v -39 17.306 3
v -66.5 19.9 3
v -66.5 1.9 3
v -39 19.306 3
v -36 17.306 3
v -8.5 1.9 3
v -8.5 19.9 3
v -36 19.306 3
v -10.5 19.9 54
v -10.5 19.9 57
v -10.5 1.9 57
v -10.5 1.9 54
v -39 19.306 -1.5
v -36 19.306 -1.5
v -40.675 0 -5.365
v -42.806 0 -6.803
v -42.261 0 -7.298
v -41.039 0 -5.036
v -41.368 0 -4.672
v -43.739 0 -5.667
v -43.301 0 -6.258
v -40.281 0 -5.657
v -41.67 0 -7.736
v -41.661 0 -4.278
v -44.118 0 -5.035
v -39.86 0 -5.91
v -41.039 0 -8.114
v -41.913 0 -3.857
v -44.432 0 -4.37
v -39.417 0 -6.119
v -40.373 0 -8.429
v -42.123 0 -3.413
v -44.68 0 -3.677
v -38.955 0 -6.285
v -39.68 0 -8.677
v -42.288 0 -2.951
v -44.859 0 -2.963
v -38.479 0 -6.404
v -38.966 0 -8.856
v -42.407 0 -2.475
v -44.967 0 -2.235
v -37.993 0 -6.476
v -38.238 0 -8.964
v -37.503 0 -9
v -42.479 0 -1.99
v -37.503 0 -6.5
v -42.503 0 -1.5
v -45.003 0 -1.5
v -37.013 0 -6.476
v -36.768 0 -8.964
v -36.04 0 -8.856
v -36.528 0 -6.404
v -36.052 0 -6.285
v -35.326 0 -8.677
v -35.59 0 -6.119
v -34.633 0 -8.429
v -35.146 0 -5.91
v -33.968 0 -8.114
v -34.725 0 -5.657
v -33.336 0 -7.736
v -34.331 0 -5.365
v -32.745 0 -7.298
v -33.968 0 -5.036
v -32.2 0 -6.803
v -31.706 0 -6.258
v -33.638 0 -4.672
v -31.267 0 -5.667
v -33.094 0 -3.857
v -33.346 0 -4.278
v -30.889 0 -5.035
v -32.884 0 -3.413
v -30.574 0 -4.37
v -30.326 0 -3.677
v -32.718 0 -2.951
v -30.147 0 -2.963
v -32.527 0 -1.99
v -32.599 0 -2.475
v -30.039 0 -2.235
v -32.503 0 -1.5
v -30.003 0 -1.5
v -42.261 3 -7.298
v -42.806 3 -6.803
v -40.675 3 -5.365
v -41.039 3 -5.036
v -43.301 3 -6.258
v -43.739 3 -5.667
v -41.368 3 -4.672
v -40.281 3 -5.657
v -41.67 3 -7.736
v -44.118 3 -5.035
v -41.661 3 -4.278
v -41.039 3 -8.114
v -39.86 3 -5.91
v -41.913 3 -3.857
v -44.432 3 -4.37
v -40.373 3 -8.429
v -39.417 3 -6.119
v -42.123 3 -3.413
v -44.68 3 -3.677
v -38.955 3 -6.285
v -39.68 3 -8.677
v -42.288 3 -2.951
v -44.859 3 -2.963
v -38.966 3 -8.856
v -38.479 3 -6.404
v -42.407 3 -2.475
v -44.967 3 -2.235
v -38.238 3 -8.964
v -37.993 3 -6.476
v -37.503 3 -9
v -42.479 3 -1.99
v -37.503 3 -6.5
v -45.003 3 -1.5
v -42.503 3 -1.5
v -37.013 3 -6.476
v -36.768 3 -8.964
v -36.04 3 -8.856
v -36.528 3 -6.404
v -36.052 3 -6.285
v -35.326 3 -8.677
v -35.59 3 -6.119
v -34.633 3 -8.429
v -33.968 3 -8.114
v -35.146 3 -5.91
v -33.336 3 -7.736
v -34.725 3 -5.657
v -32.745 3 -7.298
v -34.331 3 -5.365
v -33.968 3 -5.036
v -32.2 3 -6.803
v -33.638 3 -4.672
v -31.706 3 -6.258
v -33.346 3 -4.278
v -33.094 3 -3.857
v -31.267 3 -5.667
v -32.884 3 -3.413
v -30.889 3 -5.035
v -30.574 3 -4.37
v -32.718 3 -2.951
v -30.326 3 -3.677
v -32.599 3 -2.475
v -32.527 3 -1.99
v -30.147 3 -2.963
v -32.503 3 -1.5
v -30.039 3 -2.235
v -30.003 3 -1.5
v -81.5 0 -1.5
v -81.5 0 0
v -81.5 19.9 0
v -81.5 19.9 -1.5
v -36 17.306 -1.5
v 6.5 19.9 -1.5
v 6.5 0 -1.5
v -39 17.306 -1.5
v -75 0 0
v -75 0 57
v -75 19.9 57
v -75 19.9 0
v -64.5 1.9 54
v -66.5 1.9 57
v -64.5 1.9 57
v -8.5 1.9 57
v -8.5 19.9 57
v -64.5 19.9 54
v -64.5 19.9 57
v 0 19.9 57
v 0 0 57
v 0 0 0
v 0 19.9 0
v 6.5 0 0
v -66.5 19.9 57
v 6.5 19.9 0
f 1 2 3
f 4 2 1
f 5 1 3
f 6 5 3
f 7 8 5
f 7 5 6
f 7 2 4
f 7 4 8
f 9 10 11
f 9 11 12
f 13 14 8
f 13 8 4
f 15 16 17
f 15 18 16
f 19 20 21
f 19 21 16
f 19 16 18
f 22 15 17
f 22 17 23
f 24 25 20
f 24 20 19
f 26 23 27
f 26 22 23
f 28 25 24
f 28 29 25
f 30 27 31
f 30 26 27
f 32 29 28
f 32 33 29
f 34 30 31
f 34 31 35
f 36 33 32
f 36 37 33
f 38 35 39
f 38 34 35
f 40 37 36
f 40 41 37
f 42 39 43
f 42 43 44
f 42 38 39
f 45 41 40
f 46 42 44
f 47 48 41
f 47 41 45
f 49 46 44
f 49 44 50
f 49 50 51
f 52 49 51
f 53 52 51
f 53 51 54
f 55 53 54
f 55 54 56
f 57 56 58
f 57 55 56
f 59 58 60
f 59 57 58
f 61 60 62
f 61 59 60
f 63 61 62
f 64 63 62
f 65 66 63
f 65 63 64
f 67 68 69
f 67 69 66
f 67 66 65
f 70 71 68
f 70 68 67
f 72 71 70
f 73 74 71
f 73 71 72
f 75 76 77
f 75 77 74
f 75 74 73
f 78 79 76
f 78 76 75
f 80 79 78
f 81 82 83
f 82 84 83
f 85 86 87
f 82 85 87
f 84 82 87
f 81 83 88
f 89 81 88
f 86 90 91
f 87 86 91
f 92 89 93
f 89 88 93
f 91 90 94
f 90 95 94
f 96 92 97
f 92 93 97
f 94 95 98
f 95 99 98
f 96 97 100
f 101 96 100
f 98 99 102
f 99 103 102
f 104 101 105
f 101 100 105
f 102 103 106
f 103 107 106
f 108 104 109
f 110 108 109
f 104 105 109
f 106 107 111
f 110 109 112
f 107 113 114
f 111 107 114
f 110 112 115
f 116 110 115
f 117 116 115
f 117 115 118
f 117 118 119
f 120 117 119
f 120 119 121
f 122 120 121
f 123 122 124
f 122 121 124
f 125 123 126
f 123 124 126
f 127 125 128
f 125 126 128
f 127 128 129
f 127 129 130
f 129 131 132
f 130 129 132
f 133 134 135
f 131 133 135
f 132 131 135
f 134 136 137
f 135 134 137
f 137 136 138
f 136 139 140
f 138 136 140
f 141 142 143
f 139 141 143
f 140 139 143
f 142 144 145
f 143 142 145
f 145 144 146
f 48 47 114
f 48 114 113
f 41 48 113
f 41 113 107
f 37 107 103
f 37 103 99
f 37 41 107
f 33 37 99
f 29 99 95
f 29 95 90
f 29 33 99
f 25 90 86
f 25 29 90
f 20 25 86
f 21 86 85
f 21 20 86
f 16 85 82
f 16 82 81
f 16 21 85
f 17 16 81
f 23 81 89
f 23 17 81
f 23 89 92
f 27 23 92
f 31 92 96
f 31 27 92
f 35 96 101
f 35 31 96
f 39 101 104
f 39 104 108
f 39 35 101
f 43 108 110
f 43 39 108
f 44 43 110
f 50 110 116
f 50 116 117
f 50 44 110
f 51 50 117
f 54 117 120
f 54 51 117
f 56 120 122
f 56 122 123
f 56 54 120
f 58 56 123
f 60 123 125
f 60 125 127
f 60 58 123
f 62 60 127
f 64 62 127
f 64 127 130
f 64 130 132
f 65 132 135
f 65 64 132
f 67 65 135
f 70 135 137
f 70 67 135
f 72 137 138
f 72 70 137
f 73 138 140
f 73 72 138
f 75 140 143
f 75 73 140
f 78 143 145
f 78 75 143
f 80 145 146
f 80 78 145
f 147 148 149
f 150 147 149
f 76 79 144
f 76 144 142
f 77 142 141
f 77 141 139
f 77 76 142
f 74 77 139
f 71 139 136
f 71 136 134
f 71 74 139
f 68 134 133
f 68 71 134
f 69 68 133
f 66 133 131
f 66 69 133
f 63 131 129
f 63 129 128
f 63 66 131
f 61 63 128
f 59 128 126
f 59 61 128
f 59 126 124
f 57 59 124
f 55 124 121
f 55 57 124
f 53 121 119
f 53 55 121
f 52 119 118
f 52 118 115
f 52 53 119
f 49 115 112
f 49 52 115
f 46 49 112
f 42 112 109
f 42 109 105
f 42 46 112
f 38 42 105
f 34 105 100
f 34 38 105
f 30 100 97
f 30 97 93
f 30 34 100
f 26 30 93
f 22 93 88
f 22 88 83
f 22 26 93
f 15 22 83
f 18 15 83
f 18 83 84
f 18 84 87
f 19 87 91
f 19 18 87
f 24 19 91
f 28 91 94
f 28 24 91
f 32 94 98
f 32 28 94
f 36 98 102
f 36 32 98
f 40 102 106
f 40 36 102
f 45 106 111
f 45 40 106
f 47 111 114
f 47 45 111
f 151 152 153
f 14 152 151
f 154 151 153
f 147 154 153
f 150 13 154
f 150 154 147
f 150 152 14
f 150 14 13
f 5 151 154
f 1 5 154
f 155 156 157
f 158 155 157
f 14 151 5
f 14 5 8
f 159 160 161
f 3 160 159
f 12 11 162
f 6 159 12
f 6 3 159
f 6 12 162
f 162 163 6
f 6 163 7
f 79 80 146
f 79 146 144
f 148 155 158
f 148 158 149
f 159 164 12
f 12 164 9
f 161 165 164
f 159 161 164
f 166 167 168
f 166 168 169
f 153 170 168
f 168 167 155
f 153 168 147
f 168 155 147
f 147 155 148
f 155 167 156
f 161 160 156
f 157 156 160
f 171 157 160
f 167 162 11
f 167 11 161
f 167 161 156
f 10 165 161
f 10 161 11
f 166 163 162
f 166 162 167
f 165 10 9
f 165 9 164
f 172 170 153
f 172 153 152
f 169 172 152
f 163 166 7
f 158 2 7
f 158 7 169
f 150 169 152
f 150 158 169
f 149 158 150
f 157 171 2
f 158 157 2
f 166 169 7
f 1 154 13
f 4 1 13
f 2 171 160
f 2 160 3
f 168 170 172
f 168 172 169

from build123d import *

# Parameters (mm, degrees)
SZKIC1_W                    = 75
SZKIC1_H                    = 19.9
DODANIE_WYCI_GNI_CIE1_DEPTH = 57
SZKIC2_W                    = 88
SZKIC2_H                    = 19.9
DODANIE_WYCI_GNI_CIE2_DEPTH = 1.5
SZKIC3_W                    = 58
SZKIC3_H                    = 51
WYTNIJ_WYCI_GNI_CIE1_DEPTH  = 18
SZKIC4_W                    = 2
SZKIC4_H                    = 3
WYTNIJ_WYCI_GNI_CIE2_DEPTH  = 18
DODANIE_WYCI_GNI_CIE3_DEPTH = 3
SZKIC6_W                    = 3
SZKIC6_H                    = 2
WYTNIJ_WYCI_GNI_CIE3_DEPTH  = 4.5


with BuildPart() as part:
    # Szkic1 → Dodanie-wyciągnięcie1 (new body)
    with BuildSketch(Plane.XY):
        with Locations((-37.5, 9.95)):
            Rectangle(SZKIC1_W, SZKIC1_H)
    extrude(amount=DODANIE_WYCI_GNI_CIE1_DEPTH)

    # Szkic2 → Dodanie-wyciągnięcie2 (add)
    with BuildSketch(Plane(origin=(0, 0, 0), x_dir=(-1, 0, 0), z_dir=(0, 0, -1))):
        with Locations((37.5, 9.95)):
            Rectangle(SZKIC2_W, SZKIC2_H)
    extrude(amount=DODANIE_WYCI_GNI_CIE2_DEPTH)

    # Szkic3 → Wytnij-wyciągnięcie1 (cut)
    with BuildSketch(Plane(origin=(0, 19.9, 0), x_dir=(1, 0, 0), z_dir=(0, 1, 0))):
        with Locations((-37.5, -28.5)):
            Rectangle(SZKIC3_W, SZKIC3_H)
    extrude(amount=-WYTNIJ_WYCI_GNI_CIE1_DEPTH, mode=Mode.SUBTRACT)

    # Szkic4 → Wytnij-wyciągnięcie2 (cut)
    with BuildSketch(Plane(origin=(0, 19.9, 0), x_dir=(1, 0, 0), z_dir=(0, 1, 0))):
        with Locations((-9.5, -55.5)):
            Rectangle(SZKIC4_W, SZKIC4_H)
        with Locations((-65.5, -55.5)):
            Rectangle(SZKIC4_W, SZKIC4_H)
    extrude(amount=-WYTNIJ_WYCI_GNI_CIE2_DEPTH, mode=Mode.SUBTRACT)

    # Szkic6 → Wytnij-wyciągnięcie3 (cut)
    with BuildSketch(Plane(origin=(0, 0, -1.5), x_dir=(-1, 0, 0), z_dir=(0, 0, -1))):
        with Locations((37.5, 18.305839867)):
            Rectangle(SZKIC6_W, SZKIC6_H)
    extrude(amount=-WYTNIJ_WYCI_GNI_CIE3_DEPTH, mode=Mode.SUBTRACT)


with BuildPart() as body_2:
    # Szkic5 → Dodanie-wyciągnięcie3 (new body)
    with BuildSketch(Plane.XZ):
        with BuildLine():
            Line((-30.003197312, -1.5), (-32.503197312, -1.5))
            ThreePointArc((-32.503197312, -1.5), (-37.503197312, -6.5), (-42.503197312, -1.5))
            Line((-42.503197312, -1.5), (-45.003197312, -1.5))
            ThreePointArc((-45.003197312, -1.5), (-37.503197312, -9), (-30.003197312, -1.5))
        make_face()
    extrude(amount=-DODANIE_WYCI_GNI_CIE3_DEPTH)


solid = Compound([part.part, body_2.part])
